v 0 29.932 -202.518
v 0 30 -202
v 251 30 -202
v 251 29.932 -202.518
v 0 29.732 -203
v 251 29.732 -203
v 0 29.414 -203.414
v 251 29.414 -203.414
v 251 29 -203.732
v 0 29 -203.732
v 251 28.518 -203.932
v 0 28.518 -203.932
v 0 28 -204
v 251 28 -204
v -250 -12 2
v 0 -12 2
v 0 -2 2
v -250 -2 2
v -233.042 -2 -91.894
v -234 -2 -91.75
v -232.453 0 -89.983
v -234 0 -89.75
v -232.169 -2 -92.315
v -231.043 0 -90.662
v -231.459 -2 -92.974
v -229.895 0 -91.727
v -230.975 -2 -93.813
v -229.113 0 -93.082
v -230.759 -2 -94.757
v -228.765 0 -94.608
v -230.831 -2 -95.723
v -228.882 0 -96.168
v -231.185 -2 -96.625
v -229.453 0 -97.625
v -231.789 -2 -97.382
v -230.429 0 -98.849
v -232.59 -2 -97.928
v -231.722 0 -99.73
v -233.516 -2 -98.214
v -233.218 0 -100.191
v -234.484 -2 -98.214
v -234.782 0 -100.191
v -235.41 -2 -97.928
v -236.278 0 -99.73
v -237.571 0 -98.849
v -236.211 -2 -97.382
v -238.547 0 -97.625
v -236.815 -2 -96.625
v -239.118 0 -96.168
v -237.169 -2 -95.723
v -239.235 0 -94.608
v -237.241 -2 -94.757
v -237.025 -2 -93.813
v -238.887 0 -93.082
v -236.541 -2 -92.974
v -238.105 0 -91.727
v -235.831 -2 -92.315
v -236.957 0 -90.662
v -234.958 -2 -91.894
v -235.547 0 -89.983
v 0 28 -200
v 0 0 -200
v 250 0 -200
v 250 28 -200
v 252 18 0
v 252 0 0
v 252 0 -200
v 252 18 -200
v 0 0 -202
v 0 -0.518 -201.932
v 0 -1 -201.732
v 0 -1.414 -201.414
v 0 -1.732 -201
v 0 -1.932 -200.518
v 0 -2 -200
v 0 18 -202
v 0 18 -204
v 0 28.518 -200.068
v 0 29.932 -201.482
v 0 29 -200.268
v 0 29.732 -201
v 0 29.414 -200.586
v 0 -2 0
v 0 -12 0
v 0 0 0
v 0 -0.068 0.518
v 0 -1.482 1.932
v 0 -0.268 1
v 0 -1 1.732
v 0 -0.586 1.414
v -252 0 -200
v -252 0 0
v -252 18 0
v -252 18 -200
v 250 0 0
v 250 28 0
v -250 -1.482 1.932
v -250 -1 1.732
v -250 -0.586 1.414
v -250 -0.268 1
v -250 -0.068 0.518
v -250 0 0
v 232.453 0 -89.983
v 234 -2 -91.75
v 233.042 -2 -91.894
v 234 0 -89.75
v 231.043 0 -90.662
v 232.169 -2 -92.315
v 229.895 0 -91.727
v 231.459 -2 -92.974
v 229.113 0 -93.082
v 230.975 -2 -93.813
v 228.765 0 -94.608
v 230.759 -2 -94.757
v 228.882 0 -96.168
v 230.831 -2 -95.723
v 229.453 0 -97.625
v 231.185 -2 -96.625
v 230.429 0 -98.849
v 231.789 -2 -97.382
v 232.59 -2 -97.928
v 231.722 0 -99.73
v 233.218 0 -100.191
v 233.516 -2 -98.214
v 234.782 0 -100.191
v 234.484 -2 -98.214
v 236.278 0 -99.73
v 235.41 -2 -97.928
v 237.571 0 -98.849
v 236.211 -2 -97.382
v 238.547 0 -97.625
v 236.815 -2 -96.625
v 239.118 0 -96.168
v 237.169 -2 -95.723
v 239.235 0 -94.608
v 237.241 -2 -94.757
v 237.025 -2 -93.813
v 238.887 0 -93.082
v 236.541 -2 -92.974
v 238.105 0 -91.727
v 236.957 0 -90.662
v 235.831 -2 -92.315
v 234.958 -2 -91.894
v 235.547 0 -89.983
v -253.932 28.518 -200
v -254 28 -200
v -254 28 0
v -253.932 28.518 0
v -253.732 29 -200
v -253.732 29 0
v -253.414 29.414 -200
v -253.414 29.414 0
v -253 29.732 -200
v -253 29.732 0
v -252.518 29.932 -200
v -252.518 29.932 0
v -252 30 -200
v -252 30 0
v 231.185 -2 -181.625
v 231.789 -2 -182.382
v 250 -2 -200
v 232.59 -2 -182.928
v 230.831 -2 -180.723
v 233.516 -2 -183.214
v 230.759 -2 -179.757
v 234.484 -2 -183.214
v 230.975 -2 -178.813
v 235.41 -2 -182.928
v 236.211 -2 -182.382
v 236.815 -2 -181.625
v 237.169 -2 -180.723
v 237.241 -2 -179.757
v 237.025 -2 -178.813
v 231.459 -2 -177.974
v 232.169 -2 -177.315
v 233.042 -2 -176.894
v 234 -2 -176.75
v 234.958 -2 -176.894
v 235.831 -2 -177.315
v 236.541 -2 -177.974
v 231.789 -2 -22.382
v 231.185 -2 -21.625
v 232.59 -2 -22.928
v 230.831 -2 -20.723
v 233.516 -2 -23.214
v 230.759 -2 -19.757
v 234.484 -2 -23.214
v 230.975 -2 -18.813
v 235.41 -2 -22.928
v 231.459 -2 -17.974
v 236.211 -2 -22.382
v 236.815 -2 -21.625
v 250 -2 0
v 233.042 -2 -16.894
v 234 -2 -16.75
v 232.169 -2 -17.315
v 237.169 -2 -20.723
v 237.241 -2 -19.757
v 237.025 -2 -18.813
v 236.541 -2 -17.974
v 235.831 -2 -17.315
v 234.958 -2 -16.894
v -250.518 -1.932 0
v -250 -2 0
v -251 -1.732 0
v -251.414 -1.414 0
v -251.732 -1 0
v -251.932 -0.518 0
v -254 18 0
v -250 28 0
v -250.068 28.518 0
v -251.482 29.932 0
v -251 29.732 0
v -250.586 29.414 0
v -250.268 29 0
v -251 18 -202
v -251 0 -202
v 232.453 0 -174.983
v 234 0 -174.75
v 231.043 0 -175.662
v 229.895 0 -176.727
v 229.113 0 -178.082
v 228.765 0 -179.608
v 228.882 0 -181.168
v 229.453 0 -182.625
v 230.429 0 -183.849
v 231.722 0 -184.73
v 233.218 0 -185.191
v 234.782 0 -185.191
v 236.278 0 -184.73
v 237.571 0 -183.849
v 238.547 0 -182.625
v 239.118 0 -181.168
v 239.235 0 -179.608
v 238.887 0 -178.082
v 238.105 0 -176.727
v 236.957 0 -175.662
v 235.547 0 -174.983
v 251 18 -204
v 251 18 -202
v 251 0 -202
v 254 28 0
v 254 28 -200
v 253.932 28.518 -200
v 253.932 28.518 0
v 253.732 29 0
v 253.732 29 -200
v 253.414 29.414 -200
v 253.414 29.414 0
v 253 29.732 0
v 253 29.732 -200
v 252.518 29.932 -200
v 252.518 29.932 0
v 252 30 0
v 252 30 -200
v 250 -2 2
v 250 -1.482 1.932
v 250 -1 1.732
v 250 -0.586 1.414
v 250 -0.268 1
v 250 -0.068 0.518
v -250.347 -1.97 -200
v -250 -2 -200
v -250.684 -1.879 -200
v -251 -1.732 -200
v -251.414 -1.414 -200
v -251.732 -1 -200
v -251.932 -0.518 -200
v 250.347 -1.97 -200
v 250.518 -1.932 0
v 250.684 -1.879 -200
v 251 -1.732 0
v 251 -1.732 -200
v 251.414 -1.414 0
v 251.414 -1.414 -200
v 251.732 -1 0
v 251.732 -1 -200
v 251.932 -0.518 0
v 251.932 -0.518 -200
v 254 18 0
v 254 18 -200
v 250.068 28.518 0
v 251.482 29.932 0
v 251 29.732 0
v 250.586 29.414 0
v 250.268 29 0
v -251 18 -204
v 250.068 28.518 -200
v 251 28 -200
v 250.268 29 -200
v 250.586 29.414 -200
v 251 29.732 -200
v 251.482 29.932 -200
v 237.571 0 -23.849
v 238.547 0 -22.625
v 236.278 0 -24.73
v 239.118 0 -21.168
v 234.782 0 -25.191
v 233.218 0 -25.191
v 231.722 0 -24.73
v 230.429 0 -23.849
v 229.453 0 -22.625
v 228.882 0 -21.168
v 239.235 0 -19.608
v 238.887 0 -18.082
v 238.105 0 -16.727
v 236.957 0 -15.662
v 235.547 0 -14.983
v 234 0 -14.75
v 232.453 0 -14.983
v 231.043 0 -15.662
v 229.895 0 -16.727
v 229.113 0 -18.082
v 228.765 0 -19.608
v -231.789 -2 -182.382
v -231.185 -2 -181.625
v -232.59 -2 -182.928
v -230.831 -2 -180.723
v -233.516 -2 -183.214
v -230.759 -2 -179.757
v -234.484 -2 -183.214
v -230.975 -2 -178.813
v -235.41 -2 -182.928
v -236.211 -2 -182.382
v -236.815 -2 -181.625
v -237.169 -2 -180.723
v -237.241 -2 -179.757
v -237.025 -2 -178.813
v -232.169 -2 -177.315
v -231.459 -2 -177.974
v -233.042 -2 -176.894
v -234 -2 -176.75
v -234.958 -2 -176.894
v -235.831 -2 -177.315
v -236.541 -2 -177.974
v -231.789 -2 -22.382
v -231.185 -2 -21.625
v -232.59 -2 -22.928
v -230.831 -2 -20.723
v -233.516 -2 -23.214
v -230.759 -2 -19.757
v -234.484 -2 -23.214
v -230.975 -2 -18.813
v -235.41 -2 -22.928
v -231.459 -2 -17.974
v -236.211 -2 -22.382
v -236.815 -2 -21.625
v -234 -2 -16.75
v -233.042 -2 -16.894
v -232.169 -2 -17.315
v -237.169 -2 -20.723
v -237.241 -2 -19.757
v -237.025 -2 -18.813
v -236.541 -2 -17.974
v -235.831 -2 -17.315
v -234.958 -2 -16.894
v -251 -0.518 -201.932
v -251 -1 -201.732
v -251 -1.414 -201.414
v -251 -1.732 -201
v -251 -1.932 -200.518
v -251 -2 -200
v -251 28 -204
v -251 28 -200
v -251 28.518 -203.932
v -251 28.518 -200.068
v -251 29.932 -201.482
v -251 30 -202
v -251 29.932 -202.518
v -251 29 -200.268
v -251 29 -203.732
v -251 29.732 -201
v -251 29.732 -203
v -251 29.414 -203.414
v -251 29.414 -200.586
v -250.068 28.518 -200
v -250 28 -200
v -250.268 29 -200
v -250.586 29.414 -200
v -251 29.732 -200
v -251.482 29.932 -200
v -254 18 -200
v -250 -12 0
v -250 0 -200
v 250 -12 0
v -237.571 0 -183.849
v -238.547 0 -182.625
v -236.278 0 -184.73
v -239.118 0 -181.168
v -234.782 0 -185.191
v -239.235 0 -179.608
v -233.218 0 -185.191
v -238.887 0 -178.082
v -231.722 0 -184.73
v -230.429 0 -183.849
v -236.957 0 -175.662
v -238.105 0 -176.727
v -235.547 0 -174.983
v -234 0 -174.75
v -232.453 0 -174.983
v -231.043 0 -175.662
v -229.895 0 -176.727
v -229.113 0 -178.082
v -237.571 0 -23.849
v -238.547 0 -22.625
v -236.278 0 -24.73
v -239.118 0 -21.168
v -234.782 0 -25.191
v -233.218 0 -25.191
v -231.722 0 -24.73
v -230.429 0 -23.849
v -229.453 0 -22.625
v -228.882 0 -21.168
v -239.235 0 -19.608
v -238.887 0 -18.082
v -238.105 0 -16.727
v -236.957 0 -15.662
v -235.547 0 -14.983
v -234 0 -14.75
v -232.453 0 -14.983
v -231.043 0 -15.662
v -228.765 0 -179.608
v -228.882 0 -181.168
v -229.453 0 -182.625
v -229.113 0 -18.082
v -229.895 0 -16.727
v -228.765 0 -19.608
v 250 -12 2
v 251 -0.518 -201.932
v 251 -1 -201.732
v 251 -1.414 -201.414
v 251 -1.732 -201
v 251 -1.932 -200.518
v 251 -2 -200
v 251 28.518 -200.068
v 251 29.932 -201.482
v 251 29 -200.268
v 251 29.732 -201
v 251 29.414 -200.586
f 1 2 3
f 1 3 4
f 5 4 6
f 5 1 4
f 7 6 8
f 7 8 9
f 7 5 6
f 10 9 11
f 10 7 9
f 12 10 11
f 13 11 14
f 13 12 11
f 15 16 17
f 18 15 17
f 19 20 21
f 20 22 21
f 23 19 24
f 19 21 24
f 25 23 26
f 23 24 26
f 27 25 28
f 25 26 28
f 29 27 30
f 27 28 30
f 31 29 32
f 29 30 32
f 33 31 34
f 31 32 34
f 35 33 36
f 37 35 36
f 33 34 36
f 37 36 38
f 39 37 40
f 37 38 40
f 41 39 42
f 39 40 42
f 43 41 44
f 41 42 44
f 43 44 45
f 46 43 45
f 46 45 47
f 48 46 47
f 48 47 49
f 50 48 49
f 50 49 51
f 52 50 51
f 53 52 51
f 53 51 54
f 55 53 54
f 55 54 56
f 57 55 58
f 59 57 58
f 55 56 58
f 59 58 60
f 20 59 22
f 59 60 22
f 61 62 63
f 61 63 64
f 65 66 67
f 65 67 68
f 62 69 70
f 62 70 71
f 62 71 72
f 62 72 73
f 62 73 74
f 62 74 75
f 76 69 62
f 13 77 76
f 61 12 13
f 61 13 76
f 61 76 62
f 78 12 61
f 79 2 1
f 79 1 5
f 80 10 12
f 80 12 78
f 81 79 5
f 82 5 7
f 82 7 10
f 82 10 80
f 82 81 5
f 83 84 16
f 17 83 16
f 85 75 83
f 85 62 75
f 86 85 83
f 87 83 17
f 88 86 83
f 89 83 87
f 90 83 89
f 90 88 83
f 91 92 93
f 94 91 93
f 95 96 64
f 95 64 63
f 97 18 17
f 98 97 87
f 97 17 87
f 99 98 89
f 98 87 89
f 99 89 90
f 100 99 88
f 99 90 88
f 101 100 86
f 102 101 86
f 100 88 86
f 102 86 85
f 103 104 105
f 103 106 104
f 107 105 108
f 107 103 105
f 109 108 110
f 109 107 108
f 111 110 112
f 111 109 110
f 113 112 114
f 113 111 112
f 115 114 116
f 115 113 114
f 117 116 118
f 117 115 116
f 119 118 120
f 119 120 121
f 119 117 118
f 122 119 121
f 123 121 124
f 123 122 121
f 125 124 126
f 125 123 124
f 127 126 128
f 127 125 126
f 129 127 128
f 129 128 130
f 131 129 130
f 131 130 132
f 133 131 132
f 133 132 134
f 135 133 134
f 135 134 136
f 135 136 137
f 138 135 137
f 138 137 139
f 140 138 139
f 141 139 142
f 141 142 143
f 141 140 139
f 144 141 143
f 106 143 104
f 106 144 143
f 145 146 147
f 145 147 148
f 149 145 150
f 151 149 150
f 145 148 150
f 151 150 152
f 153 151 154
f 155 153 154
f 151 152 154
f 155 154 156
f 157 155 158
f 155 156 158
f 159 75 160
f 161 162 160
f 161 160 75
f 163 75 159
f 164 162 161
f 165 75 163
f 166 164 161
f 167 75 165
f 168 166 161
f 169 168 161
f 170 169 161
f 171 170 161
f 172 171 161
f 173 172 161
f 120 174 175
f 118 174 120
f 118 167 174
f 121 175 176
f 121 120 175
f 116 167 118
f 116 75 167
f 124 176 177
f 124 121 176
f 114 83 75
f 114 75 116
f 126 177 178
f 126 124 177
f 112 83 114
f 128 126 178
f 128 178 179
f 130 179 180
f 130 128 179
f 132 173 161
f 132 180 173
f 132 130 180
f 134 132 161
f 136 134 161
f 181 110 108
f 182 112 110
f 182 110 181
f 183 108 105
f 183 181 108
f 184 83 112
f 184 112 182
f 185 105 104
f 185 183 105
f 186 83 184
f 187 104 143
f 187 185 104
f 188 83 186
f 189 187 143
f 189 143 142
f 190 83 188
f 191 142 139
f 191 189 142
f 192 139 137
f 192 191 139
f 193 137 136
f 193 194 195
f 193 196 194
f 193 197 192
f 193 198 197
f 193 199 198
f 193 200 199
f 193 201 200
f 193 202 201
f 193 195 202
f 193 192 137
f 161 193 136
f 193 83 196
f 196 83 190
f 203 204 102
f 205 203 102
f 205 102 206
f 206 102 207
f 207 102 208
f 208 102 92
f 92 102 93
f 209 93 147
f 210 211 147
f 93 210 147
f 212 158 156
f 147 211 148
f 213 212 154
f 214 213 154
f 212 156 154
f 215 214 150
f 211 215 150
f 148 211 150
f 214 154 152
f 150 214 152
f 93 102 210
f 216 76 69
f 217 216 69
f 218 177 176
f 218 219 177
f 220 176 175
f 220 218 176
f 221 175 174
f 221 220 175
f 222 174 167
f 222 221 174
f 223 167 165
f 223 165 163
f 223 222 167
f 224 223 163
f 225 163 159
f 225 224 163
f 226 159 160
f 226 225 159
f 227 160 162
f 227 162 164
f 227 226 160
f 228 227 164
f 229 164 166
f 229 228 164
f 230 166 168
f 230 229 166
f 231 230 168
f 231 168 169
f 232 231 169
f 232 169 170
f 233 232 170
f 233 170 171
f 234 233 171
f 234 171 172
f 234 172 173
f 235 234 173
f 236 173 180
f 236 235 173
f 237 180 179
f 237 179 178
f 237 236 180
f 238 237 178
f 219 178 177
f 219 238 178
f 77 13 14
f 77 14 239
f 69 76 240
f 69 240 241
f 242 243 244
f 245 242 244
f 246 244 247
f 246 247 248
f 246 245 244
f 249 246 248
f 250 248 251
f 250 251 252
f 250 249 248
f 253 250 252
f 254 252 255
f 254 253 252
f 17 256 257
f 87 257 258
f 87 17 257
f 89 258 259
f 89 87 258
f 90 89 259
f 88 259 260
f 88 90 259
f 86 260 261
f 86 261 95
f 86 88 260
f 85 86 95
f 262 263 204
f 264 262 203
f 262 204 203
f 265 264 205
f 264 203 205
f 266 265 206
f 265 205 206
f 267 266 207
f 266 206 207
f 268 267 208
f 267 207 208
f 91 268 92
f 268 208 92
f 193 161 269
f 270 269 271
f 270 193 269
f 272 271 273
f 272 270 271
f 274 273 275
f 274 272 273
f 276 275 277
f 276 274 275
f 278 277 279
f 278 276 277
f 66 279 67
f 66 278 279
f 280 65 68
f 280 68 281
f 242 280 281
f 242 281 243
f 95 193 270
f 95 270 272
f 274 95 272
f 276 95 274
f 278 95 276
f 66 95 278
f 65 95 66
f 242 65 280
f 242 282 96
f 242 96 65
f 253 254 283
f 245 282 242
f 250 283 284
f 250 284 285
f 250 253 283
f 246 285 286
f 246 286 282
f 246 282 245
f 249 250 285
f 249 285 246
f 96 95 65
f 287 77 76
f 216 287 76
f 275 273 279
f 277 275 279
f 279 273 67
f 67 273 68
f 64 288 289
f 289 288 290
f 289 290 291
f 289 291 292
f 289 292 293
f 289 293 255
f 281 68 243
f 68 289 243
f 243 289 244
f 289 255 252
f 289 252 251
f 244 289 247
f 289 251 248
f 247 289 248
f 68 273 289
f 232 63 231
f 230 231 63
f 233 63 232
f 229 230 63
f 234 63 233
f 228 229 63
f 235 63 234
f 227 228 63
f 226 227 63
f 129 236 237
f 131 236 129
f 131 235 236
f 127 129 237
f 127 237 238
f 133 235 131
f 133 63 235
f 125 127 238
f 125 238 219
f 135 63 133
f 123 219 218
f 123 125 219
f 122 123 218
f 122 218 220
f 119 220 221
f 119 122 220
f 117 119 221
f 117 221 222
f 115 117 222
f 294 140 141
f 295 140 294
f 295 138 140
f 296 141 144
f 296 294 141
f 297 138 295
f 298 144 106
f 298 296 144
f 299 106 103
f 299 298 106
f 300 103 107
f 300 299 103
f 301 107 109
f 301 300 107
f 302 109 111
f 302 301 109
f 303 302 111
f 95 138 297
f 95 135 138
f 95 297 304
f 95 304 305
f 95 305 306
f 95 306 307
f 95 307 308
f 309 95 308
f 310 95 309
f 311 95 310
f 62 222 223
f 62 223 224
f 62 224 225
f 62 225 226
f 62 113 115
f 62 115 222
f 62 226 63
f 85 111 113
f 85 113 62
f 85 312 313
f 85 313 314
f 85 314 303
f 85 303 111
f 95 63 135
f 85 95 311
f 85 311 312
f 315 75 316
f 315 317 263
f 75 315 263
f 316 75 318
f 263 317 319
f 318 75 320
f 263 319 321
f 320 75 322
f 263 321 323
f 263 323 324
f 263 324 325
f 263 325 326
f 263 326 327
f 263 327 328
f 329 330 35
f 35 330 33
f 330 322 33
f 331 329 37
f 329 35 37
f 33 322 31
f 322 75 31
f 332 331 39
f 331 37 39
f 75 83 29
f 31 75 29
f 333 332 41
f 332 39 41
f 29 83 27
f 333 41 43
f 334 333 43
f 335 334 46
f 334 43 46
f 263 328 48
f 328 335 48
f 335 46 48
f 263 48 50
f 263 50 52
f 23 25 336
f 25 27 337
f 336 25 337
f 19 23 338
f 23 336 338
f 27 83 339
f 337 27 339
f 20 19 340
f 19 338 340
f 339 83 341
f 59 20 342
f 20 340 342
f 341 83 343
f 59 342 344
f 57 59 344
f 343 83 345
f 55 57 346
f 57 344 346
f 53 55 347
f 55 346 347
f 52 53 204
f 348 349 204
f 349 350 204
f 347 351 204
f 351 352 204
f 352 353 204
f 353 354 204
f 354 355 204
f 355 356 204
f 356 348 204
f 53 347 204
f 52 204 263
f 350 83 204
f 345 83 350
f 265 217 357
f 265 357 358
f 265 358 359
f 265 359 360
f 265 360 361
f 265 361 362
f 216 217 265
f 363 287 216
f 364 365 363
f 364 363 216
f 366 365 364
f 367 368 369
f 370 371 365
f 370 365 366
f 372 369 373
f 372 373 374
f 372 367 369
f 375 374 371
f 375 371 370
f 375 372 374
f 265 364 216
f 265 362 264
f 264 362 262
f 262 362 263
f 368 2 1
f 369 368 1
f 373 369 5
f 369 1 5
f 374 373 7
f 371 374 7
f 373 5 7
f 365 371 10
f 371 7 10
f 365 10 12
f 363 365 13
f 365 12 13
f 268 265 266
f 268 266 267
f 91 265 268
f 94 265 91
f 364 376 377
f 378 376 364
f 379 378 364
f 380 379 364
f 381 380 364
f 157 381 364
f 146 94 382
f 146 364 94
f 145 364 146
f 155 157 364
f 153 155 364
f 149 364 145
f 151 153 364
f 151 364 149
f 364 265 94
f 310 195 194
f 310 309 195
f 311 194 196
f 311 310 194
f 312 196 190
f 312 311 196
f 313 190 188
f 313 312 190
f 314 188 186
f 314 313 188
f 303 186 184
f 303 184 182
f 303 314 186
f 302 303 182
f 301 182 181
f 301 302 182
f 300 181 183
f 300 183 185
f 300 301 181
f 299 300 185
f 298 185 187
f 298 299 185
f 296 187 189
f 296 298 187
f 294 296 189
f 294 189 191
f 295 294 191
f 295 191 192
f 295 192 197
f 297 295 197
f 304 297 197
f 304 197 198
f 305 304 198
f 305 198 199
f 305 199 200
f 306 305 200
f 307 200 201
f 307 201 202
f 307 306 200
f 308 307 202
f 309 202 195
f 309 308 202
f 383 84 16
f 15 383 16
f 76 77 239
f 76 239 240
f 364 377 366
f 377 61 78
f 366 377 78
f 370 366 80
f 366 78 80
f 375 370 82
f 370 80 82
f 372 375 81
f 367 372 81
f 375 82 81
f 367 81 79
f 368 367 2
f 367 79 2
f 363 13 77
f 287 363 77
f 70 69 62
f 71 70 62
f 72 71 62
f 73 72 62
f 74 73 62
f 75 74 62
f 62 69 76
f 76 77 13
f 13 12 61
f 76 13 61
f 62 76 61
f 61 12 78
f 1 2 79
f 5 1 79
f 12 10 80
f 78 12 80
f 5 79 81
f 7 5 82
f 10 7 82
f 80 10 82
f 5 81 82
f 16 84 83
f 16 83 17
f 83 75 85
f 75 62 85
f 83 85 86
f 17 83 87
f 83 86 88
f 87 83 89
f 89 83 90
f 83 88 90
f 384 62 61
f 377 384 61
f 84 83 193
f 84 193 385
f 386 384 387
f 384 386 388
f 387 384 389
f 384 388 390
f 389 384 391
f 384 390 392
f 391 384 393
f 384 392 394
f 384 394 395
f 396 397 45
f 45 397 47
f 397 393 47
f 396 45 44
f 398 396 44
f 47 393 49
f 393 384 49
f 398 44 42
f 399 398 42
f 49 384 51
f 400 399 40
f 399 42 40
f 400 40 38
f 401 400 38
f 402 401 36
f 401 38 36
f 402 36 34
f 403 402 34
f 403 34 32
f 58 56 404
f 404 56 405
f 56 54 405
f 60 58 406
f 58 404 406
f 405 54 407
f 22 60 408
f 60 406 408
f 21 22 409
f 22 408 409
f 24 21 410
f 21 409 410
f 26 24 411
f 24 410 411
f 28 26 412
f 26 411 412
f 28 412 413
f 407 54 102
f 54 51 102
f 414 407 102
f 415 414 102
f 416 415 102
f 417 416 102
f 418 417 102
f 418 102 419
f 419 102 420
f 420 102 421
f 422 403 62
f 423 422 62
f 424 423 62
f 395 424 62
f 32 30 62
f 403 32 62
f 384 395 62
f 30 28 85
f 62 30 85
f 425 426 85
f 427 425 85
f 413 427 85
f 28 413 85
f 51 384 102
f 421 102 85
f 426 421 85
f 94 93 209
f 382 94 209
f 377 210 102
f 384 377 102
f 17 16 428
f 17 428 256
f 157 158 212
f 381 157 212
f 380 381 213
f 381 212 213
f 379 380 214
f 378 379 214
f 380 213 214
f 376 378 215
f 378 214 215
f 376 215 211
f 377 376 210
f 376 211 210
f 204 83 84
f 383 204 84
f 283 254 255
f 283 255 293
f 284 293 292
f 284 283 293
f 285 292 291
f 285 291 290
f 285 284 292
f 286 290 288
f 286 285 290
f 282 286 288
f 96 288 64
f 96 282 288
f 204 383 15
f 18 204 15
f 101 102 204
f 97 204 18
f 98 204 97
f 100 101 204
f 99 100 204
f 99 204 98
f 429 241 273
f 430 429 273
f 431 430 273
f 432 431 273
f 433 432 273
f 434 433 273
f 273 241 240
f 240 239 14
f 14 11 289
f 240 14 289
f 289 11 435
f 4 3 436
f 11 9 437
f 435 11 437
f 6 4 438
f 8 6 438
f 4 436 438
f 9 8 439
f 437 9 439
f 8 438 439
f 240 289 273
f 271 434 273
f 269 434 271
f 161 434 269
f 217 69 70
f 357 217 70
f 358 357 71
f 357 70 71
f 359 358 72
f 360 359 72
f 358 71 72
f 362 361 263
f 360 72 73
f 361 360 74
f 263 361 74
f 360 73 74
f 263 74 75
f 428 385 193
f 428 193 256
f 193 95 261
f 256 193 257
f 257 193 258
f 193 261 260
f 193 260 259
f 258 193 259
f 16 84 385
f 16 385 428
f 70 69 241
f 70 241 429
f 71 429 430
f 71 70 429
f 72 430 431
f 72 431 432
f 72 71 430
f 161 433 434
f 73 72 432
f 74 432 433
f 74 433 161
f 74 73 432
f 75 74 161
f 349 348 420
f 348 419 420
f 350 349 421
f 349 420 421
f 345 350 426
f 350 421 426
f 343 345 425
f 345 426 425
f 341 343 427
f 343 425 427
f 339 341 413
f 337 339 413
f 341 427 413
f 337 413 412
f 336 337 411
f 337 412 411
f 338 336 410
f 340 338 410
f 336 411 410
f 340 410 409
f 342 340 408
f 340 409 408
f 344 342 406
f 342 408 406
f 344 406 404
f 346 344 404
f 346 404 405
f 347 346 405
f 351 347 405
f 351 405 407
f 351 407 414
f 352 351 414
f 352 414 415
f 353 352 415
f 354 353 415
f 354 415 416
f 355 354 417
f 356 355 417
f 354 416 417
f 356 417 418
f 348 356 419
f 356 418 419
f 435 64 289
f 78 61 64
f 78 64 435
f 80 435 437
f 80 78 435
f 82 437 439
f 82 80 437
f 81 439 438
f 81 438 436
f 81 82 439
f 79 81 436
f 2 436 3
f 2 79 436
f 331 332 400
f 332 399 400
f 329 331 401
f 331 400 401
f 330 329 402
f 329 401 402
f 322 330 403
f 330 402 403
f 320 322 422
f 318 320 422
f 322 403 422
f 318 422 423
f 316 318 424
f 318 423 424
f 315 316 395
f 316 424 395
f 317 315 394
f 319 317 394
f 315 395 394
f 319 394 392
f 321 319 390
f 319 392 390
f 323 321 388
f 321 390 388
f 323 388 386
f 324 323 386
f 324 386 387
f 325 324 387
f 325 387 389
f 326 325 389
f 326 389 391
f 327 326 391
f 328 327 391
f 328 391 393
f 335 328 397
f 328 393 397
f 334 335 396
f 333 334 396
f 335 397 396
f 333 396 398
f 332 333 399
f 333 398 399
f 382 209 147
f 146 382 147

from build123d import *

# Parameters (mm, degrees)
EXTRUDE_1_DEPTH = 200
EXTRUDE_2_DEPTH = 251
EXTRUDE_3_DEPTH = 250


with BuildPart() as part:
    # 草圖1 → 擠出1 (new body)
    with BuildSketch(Plane.XY):
        with BuildLine():
            Line((0, 0), (0, -2))
            Line((0, -2), (250, -2))
            ThreePointArc((250, -2), (251.414213562, -1.414213562), (252, 0))
            Line((252, 0), (252, 18))
            Line((252, 18), (254, 18))
            Line((254, 18), (254, 28))
            ThreePointArc((254, 28), (253.414213562, 29.414213562), (252, 30))
            ThreePointArc((252, 30), (250.585786438, 29.414213562), (250, 28))
            Line((250, 28), (250, 0))
            Line((250, 0), (0, 0))
        make_face()
    extrude(amount=-EXTRUDE_1_DEPTH)

    # 草圖2 → 擠出2 (add)
    with BuildSketch(Plane.ZY):
        with BuildLine():
            Line((-200, -2), (-200, 28))
            ThreePointArc((-200, 28), (-200.585786438, 29.414213562), (-202, 30))
            ThreePointArc((-202, 30), (-203.414213562, 29.414213562), (-204, 28))
            Line((-204, 28), (-204, 18))
            Line((-204, 18), (-202, 18))
            Line((-202, 18), (-202, 0))
            ThreePointArc((-202, 0), (-201.414213562, -1.414213562), (-200, -2))
        make_face()
    extrude(amount=-EXTRUDE_2_DEPTH)

    # 草圖3 → 擠出3 (add)
    with BuildSketch(Plane.ZY):
        with BuildLine():
            Line((0, 0), (0, -12))
            Line((0, -12), (2, -12))
            Line((2, -12), (2, -2))
            ThreePointArc((2, -2), (1.414213562, -0.585786438), (0, 0))
        make_face()
    extrude(amount=-EXTRUDE_3_DEPTH)

    # 草圖4 → 迴轉1 (revolve, cut)
    with BuildSketch(Plane(origin=(234, 0, -200), x_dir=(0, 0, 1), z_dir=(-1, 0, 0)), mode=Mode.PRIVATE) as cut_revolve_1_sk:
        Polygon((180, 0), (180, -2), (176.75, -2), (174.75, 0), align=None)
    revolve(cut_revolve_1_sk.sketch.rotate(Axis((234, 0, -20), (0, -1, 0)), 180), axis=Axis((234, 0, -20), (0, -1, 0)), mode=Mode.SUBTRACT)

    # 草圖5 → 迴轉2 (revolve, cut)
    with BuildSketch(Plane(origin=(234, 0, -200), x_dir=(0, 0, 1), z_dir=(-1, 0, 0)), mode=Mode.PRIVATE) as cut_revolve_2_sk:
        Polygon((20, 0), (20, -2), (16.75, -2), (14.75, 0), align=None)
    revolve(cut_revolve_2_sk.sketch.rotate(Axis((234, 0, -180), (0, -1, 0)), 180), axis=Axis((234, 0, -180), (0, -1, 0)), mode=Mode.SUBTRACT)

    # 草圖6 → 迴轉3 (revolve, cut)
    with BuildSketch(Plane(origin=(234, 0, -200), x_dir=(0, 0, 1), z_dir=(-1, 0, 0)), mode=Mode.PRIVATE) as cut_revolve_3_sk:
        Polygon((105, 0), (105, -2), (101.75, -2), (99.75, 0), align=None)
    revolve(cut_revolve_3_sk.sketch.rotate(Axis((234, 0, -95), (0, -1, 0)), 180), axis=Axis((234, 0, -95), (0, -1, 0)), mode=Mode.SUBTRACT)


with BuildPart() as body_2:
    # 鏡射1: mirrored copy
    add(part.part.mirror(Plane(origin=(0, -1, -120), x_dir=(0, 0, 1), z_dir=(-1, 0, 0))))


solid = Compound([part.part, body_2.part])
